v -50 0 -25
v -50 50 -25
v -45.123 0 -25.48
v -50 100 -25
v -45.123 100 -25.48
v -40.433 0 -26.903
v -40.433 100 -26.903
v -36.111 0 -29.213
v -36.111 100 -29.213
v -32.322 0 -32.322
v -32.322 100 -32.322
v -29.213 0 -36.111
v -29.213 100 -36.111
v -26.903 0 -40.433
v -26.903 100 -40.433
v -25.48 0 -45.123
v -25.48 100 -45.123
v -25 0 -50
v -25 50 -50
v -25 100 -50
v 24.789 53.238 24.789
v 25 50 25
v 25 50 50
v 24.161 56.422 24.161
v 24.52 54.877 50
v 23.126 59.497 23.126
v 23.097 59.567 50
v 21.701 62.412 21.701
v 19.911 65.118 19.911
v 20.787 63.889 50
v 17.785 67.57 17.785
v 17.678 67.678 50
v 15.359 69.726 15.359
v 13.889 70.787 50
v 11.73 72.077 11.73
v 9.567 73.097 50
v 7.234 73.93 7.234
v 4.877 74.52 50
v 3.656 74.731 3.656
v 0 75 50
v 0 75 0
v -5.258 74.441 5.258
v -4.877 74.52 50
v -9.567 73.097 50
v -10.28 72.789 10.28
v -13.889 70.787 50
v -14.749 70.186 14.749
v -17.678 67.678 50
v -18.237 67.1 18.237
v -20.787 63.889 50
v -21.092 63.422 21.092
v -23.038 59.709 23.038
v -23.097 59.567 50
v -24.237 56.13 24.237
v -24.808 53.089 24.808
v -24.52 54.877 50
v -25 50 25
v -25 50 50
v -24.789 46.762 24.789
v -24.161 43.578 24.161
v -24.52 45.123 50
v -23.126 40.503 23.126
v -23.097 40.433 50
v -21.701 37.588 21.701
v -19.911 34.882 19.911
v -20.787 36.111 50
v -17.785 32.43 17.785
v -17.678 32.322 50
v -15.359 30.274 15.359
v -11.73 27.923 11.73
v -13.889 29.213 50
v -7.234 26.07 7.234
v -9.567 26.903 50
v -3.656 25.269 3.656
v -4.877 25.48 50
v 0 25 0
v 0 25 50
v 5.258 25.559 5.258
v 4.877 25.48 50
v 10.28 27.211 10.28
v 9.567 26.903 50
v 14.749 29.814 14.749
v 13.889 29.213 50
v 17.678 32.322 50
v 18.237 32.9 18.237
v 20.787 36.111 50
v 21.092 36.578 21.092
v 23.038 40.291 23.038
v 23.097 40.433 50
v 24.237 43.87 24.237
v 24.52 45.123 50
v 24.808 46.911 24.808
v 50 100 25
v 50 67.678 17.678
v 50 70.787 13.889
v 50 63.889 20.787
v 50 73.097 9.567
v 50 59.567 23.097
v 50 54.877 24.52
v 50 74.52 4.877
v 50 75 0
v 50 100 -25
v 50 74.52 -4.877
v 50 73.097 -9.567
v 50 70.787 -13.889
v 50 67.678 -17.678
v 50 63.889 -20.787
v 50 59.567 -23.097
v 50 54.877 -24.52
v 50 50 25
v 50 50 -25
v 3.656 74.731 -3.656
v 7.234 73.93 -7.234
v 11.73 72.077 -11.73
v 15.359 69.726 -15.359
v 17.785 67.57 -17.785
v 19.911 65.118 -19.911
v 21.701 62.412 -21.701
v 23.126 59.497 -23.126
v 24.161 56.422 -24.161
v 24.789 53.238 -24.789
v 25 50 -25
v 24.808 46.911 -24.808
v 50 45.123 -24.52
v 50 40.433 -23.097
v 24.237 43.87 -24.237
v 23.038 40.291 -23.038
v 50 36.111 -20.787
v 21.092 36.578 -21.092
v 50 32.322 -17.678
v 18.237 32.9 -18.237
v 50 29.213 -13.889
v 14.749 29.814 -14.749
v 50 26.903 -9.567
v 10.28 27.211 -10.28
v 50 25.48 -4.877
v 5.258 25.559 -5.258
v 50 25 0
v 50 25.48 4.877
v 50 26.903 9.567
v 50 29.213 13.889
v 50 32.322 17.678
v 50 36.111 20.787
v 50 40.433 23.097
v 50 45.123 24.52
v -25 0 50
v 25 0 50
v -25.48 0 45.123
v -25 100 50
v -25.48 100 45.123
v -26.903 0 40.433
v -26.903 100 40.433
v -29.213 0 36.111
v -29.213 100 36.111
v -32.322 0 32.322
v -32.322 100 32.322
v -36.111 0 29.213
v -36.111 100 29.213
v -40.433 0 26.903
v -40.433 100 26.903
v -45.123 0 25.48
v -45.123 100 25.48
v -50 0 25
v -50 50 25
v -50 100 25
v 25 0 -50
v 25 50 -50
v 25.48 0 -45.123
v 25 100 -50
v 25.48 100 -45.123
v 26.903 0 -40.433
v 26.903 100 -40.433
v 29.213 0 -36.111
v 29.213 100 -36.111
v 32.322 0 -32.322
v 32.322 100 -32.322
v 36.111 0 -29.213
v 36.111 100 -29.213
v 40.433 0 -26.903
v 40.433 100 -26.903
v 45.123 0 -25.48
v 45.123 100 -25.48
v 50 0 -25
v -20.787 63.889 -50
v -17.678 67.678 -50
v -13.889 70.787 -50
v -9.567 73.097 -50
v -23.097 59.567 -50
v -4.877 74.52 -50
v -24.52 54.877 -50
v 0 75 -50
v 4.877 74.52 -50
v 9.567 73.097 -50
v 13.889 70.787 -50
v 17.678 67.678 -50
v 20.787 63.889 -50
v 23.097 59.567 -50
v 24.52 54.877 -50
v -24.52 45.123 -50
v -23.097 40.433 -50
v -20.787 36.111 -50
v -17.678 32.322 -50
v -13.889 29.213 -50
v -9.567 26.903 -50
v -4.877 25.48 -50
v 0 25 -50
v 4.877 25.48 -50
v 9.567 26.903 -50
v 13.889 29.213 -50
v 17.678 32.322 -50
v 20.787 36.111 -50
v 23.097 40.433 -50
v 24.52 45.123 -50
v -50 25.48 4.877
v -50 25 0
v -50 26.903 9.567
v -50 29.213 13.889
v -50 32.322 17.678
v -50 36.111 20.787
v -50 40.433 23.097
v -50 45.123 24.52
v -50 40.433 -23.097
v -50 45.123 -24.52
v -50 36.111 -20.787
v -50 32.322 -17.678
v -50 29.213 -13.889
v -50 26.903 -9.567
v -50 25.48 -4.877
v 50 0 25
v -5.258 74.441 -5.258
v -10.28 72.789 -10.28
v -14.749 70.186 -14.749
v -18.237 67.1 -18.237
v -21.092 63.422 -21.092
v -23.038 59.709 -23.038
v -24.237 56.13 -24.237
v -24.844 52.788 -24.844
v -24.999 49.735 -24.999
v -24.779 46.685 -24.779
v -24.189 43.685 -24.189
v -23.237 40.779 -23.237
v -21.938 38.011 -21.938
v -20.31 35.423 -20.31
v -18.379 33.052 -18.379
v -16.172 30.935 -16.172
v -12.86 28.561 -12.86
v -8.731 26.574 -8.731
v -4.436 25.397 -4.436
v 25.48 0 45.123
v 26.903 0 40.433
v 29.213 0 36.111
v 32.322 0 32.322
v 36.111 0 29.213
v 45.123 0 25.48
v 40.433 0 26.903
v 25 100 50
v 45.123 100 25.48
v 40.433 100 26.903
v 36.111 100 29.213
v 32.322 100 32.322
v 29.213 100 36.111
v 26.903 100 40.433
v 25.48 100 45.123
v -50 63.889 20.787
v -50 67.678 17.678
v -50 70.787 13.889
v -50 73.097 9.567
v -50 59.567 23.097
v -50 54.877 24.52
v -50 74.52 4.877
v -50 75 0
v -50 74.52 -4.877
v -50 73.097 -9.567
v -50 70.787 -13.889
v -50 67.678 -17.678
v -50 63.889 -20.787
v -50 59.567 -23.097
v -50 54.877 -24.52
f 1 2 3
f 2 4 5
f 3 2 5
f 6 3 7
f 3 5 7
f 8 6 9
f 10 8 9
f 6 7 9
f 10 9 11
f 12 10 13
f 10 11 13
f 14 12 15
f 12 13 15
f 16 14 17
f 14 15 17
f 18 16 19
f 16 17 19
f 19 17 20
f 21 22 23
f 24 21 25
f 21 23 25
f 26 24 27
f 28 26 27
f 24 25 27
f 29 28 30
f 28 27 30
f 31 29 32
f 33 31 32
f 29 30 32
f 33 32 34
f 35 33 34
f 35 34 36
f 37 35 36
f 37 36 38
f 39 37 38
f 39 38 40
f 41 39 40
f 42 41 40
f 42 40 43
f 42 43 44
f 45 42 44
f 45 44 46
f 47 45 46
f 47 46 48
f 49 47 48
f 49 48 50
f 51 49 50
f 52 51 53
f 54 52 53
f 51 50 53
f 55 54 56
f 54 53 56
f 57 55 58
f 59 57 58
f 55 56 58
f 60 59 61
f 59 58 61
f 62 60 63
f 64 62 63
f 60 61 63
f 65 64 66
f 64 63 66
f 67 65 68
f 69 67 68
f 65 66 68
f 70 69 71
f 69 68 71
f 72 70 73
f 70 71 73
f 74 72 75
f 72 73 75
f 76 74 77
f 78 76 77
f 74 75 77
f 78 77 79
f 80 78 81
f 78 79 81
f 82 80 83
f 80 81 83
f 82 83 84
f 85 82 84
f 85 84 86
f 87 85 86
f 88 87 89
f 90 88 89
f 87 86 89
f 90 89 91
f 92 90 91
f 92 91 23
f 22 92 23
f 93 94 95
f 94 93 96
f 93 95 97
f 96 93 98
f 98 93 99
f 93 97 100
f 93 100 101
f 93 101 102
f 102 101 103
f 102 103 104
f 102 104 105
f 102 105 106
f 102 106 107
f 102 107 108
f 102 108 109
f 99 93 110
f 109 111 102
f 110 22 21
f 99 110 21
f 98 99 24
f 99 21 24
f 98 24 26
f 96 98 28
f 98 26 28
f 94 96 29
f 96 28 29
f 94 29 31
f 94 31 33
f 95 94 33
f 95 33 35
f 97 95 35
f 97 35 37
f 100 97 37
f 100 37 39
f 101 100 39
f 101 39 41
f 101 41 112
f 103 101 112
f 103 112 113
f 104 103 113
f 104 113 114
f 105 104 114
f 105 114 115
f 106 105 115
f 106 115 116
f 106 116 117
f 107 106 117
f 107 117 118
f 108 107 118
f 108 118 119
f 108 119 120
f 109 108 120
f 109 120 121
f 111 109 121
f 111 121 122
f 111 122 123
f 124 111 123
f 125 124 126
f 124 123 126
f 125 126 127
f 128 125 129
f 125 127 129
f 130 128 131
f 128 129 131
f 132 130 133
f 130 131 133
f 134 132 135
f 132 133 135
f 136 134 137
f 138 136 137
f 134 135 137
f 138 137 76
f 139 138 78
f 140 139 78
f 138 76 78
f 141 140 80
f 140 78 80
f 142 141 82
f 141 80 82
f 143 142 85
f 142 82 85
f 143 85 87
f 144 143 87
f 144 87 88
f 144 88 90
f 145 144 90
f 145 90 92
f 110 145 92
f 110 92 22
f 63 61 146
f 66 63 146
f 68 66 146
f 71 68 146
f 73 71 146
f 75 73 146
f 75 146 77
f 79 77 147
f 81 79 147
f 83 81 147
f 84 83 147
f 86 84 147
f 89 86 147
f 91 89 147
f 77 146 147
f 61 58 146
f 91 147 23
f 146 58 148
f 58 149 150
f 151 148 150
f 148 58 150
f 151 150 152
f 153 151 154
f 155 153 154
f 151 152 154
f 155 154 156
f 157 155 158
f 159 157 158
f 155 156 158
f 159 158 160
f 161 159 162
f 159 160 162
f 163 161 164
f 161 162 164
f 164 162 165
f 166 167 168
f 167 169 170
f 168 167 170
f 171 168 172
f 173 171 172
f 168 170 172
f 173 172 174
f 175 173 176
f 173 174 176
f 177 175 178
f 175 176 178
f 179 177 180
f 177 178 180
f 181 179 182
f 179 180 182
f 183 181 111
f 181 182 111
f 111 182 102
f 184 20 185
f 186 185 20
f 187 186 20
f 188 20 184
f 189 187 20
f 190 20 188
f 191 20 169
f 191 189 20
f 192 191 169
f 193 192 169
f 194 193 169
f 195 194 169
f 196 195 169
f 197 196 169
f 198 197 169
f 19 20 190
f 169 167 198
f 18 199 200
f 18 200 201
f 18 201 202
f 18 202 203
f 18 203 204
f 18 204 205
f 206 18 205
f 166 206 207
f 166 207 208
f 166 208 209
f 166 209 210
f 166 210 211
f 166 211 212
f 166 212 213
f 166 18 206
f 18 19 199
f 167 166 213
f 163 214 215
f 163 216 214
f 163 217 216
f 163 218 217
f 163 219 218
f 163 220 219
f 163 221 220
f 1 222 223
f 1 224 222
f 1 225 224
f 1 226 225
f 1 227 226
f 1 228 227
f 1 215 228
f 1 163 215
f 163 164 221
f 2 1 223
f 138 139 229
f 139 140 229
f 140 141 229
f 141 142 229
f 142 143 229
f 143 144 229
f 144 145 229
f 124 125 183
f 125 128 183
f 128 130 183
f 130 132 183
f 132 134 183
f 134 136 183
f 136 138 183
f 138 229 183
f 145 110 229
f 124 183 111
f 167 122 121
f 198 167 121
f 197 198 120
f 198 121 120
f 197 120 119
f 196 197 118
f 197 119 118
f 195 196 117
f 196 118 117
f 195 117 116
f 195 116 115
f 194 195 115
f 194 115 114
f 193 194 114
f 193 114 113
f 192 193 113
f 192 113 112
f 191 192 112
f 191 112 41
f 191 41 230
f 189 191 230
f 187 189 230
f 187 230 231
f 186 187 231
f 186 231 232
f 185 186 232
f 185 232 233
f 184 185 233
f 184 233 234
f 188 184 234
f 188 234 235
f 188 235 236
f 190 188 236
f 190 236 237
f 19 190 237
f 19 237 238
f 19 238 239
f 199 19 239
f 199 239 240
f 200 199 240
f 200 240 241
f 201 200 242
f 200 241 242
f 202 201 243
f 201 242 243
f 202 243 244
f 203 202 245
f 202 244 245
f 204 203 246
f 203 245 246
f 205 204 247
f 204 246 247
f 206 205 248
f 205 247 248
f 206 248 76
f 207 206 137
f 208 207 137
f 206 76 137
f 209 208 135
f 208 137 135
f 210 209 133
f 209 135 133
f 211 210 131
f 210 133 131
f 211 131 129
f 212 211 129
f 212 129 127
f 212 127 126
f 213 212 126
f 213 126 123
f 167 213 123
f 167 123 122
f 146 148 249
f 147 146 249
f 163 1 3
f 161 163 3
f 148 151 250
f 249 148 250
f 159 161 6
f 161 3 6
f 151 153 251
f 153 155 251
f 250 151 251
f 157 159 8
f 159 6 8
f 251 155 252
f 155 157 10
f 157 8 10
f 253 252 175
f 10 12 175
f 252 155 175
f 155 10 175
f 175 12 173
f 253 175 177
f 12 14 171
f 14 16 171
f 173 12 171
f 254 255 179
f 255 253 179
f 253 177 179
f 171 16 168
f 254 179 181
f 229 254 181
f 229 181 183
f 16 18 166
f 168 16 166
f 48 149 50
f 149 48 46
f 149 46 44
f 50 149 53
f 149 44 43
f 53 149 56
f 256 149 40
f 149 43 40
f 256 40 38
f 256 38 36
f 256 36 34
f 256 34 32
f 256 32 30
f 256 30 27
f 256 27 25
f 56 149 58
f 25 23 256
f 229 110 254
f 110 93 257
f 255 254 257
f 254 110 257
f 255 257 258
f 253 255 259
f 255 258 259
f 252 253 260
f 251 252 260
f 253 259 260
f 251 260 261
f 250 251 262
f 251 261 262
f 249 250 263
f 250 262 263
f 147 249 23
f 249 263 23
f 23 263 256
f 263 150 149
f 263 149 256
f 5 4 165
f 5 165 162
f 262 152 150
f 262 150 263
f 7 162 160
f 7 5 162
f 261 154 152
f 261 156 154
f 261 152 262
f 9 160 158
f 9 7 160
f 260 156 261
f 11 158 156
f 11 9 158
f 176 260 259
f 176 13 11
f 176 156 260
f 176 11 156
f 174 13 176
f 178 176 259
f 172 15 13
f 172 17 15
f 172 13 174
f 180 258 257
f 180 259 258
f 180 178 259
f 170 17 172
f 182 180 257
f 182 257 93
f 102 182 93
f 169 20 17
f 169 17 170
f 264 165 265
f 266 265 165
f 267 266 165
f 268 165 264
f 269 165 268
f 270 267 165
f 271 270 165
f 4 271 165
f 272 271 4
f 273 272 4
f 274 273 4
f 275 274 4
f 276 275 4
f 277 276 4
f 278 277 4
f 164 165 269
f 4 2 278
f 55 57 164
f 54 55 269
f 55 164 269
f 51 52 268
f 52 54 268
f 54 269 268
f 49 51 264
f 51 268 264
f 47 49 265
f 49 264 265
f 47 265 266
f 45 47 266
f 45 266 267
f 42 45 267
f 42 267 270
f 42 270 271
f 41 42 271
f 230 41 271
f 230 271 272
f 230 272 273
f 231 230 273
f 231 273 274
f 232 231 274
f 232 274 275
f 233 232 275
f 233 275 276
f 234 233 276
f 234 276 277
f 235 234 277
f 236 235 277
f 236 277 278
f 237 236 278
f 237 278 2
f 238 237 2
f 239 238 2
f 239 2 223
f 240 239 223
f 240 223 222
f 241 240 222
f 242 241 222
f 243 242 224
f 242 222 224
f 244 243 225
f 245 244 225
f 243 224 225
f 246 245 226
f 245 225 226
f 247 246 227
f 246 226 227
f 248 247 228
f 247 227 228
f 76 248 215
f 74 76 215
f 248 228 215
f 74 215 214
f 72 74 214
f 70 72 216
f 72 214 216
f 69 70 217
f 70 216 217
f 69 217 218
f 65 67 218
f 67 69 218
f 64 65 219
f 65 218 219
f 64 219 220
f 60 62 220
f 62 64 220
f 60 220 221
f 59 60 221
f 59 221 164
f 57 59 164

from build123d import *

# Parameters (mm, degrees)
SKETCH1_W            = 100
SKETCH1_H            = 100
BOSS_EXTRUDE1_DEPTH  = 100
SKETCH3_R            = 25
CUT_EXTRUDE3_DEPTH   = 151
SKETCH5_R            = 25
CUT_EXTRUDE4_DEPTH   = 151
SKETCH9_R            = 25
CUT_EXTRUDE5_DEPTH   = 100
LPATTERN1_COUNT      = 2
LPATTERN1_PITCH      = 100
LPATTERN1_COUNT_DIR2 = 2
LPATTERN1_PITCH_DIR2 = 100


with BuildPart() as part:
    # Sketch1 → Boss-Extrude1 (new body)
    with BuildSketch(Plane(origin=(0, 0, 0), x_dir=(1, 0, 0), z_dir=(0, 1, 0))):
        Rectangle(SKETCH1_W, SKETCH1_H)
    extrude(amount=BOSS_EXTRUDE1_DEPTH)

    # Sketch3 → Cut-Extrude3 (cut, through all)
    with BuildSketch(Plane.XY.offset(50)):
        with Locations((0, 50)):
            Circle(SKETCH3_R)
    extrude(amount=-CUT_EXTRUDE3_DEPTH, mode=Mode.SUBTRACT)

    # Sketch5 → Cut-Extrude4 (cut, through all)
    with BuildSketch(Plane.ZY.offset(50)):
        with Locations((0, 50)):
            Circle(SKETCH5_R)
    extrude(amount=-CUT_EXTRUDE4_DEPTH, mode=Mode.SUBTRACT)

    # Sketch9 → Cut-Extrude5 (cut)
    with BuildSketch(Plane.ZX.offset(100)):
        with Locations((-50, -50)):
            Circle(SKETCH9_R)
    cut_extrude5 = extrude(amount=-CUT_EXTRUDE5_DEPTH, mode=Mode.SUBTRACT)

    # LPattern1: Cut-Extrude5 2 × 2
    with Locations(*[(i * LPATTERN1_PITCH, 0, j * LPATTERN1_PITCH_DIR2) for i in range(LPATTERN1_COUNT) for j in range(LPATTERN1_COUNT_DIR2) if (i, j) != (0, 0)]):
        add(cut_extrude5, mode=Mode.SUBTRACT)


solid = part.part
